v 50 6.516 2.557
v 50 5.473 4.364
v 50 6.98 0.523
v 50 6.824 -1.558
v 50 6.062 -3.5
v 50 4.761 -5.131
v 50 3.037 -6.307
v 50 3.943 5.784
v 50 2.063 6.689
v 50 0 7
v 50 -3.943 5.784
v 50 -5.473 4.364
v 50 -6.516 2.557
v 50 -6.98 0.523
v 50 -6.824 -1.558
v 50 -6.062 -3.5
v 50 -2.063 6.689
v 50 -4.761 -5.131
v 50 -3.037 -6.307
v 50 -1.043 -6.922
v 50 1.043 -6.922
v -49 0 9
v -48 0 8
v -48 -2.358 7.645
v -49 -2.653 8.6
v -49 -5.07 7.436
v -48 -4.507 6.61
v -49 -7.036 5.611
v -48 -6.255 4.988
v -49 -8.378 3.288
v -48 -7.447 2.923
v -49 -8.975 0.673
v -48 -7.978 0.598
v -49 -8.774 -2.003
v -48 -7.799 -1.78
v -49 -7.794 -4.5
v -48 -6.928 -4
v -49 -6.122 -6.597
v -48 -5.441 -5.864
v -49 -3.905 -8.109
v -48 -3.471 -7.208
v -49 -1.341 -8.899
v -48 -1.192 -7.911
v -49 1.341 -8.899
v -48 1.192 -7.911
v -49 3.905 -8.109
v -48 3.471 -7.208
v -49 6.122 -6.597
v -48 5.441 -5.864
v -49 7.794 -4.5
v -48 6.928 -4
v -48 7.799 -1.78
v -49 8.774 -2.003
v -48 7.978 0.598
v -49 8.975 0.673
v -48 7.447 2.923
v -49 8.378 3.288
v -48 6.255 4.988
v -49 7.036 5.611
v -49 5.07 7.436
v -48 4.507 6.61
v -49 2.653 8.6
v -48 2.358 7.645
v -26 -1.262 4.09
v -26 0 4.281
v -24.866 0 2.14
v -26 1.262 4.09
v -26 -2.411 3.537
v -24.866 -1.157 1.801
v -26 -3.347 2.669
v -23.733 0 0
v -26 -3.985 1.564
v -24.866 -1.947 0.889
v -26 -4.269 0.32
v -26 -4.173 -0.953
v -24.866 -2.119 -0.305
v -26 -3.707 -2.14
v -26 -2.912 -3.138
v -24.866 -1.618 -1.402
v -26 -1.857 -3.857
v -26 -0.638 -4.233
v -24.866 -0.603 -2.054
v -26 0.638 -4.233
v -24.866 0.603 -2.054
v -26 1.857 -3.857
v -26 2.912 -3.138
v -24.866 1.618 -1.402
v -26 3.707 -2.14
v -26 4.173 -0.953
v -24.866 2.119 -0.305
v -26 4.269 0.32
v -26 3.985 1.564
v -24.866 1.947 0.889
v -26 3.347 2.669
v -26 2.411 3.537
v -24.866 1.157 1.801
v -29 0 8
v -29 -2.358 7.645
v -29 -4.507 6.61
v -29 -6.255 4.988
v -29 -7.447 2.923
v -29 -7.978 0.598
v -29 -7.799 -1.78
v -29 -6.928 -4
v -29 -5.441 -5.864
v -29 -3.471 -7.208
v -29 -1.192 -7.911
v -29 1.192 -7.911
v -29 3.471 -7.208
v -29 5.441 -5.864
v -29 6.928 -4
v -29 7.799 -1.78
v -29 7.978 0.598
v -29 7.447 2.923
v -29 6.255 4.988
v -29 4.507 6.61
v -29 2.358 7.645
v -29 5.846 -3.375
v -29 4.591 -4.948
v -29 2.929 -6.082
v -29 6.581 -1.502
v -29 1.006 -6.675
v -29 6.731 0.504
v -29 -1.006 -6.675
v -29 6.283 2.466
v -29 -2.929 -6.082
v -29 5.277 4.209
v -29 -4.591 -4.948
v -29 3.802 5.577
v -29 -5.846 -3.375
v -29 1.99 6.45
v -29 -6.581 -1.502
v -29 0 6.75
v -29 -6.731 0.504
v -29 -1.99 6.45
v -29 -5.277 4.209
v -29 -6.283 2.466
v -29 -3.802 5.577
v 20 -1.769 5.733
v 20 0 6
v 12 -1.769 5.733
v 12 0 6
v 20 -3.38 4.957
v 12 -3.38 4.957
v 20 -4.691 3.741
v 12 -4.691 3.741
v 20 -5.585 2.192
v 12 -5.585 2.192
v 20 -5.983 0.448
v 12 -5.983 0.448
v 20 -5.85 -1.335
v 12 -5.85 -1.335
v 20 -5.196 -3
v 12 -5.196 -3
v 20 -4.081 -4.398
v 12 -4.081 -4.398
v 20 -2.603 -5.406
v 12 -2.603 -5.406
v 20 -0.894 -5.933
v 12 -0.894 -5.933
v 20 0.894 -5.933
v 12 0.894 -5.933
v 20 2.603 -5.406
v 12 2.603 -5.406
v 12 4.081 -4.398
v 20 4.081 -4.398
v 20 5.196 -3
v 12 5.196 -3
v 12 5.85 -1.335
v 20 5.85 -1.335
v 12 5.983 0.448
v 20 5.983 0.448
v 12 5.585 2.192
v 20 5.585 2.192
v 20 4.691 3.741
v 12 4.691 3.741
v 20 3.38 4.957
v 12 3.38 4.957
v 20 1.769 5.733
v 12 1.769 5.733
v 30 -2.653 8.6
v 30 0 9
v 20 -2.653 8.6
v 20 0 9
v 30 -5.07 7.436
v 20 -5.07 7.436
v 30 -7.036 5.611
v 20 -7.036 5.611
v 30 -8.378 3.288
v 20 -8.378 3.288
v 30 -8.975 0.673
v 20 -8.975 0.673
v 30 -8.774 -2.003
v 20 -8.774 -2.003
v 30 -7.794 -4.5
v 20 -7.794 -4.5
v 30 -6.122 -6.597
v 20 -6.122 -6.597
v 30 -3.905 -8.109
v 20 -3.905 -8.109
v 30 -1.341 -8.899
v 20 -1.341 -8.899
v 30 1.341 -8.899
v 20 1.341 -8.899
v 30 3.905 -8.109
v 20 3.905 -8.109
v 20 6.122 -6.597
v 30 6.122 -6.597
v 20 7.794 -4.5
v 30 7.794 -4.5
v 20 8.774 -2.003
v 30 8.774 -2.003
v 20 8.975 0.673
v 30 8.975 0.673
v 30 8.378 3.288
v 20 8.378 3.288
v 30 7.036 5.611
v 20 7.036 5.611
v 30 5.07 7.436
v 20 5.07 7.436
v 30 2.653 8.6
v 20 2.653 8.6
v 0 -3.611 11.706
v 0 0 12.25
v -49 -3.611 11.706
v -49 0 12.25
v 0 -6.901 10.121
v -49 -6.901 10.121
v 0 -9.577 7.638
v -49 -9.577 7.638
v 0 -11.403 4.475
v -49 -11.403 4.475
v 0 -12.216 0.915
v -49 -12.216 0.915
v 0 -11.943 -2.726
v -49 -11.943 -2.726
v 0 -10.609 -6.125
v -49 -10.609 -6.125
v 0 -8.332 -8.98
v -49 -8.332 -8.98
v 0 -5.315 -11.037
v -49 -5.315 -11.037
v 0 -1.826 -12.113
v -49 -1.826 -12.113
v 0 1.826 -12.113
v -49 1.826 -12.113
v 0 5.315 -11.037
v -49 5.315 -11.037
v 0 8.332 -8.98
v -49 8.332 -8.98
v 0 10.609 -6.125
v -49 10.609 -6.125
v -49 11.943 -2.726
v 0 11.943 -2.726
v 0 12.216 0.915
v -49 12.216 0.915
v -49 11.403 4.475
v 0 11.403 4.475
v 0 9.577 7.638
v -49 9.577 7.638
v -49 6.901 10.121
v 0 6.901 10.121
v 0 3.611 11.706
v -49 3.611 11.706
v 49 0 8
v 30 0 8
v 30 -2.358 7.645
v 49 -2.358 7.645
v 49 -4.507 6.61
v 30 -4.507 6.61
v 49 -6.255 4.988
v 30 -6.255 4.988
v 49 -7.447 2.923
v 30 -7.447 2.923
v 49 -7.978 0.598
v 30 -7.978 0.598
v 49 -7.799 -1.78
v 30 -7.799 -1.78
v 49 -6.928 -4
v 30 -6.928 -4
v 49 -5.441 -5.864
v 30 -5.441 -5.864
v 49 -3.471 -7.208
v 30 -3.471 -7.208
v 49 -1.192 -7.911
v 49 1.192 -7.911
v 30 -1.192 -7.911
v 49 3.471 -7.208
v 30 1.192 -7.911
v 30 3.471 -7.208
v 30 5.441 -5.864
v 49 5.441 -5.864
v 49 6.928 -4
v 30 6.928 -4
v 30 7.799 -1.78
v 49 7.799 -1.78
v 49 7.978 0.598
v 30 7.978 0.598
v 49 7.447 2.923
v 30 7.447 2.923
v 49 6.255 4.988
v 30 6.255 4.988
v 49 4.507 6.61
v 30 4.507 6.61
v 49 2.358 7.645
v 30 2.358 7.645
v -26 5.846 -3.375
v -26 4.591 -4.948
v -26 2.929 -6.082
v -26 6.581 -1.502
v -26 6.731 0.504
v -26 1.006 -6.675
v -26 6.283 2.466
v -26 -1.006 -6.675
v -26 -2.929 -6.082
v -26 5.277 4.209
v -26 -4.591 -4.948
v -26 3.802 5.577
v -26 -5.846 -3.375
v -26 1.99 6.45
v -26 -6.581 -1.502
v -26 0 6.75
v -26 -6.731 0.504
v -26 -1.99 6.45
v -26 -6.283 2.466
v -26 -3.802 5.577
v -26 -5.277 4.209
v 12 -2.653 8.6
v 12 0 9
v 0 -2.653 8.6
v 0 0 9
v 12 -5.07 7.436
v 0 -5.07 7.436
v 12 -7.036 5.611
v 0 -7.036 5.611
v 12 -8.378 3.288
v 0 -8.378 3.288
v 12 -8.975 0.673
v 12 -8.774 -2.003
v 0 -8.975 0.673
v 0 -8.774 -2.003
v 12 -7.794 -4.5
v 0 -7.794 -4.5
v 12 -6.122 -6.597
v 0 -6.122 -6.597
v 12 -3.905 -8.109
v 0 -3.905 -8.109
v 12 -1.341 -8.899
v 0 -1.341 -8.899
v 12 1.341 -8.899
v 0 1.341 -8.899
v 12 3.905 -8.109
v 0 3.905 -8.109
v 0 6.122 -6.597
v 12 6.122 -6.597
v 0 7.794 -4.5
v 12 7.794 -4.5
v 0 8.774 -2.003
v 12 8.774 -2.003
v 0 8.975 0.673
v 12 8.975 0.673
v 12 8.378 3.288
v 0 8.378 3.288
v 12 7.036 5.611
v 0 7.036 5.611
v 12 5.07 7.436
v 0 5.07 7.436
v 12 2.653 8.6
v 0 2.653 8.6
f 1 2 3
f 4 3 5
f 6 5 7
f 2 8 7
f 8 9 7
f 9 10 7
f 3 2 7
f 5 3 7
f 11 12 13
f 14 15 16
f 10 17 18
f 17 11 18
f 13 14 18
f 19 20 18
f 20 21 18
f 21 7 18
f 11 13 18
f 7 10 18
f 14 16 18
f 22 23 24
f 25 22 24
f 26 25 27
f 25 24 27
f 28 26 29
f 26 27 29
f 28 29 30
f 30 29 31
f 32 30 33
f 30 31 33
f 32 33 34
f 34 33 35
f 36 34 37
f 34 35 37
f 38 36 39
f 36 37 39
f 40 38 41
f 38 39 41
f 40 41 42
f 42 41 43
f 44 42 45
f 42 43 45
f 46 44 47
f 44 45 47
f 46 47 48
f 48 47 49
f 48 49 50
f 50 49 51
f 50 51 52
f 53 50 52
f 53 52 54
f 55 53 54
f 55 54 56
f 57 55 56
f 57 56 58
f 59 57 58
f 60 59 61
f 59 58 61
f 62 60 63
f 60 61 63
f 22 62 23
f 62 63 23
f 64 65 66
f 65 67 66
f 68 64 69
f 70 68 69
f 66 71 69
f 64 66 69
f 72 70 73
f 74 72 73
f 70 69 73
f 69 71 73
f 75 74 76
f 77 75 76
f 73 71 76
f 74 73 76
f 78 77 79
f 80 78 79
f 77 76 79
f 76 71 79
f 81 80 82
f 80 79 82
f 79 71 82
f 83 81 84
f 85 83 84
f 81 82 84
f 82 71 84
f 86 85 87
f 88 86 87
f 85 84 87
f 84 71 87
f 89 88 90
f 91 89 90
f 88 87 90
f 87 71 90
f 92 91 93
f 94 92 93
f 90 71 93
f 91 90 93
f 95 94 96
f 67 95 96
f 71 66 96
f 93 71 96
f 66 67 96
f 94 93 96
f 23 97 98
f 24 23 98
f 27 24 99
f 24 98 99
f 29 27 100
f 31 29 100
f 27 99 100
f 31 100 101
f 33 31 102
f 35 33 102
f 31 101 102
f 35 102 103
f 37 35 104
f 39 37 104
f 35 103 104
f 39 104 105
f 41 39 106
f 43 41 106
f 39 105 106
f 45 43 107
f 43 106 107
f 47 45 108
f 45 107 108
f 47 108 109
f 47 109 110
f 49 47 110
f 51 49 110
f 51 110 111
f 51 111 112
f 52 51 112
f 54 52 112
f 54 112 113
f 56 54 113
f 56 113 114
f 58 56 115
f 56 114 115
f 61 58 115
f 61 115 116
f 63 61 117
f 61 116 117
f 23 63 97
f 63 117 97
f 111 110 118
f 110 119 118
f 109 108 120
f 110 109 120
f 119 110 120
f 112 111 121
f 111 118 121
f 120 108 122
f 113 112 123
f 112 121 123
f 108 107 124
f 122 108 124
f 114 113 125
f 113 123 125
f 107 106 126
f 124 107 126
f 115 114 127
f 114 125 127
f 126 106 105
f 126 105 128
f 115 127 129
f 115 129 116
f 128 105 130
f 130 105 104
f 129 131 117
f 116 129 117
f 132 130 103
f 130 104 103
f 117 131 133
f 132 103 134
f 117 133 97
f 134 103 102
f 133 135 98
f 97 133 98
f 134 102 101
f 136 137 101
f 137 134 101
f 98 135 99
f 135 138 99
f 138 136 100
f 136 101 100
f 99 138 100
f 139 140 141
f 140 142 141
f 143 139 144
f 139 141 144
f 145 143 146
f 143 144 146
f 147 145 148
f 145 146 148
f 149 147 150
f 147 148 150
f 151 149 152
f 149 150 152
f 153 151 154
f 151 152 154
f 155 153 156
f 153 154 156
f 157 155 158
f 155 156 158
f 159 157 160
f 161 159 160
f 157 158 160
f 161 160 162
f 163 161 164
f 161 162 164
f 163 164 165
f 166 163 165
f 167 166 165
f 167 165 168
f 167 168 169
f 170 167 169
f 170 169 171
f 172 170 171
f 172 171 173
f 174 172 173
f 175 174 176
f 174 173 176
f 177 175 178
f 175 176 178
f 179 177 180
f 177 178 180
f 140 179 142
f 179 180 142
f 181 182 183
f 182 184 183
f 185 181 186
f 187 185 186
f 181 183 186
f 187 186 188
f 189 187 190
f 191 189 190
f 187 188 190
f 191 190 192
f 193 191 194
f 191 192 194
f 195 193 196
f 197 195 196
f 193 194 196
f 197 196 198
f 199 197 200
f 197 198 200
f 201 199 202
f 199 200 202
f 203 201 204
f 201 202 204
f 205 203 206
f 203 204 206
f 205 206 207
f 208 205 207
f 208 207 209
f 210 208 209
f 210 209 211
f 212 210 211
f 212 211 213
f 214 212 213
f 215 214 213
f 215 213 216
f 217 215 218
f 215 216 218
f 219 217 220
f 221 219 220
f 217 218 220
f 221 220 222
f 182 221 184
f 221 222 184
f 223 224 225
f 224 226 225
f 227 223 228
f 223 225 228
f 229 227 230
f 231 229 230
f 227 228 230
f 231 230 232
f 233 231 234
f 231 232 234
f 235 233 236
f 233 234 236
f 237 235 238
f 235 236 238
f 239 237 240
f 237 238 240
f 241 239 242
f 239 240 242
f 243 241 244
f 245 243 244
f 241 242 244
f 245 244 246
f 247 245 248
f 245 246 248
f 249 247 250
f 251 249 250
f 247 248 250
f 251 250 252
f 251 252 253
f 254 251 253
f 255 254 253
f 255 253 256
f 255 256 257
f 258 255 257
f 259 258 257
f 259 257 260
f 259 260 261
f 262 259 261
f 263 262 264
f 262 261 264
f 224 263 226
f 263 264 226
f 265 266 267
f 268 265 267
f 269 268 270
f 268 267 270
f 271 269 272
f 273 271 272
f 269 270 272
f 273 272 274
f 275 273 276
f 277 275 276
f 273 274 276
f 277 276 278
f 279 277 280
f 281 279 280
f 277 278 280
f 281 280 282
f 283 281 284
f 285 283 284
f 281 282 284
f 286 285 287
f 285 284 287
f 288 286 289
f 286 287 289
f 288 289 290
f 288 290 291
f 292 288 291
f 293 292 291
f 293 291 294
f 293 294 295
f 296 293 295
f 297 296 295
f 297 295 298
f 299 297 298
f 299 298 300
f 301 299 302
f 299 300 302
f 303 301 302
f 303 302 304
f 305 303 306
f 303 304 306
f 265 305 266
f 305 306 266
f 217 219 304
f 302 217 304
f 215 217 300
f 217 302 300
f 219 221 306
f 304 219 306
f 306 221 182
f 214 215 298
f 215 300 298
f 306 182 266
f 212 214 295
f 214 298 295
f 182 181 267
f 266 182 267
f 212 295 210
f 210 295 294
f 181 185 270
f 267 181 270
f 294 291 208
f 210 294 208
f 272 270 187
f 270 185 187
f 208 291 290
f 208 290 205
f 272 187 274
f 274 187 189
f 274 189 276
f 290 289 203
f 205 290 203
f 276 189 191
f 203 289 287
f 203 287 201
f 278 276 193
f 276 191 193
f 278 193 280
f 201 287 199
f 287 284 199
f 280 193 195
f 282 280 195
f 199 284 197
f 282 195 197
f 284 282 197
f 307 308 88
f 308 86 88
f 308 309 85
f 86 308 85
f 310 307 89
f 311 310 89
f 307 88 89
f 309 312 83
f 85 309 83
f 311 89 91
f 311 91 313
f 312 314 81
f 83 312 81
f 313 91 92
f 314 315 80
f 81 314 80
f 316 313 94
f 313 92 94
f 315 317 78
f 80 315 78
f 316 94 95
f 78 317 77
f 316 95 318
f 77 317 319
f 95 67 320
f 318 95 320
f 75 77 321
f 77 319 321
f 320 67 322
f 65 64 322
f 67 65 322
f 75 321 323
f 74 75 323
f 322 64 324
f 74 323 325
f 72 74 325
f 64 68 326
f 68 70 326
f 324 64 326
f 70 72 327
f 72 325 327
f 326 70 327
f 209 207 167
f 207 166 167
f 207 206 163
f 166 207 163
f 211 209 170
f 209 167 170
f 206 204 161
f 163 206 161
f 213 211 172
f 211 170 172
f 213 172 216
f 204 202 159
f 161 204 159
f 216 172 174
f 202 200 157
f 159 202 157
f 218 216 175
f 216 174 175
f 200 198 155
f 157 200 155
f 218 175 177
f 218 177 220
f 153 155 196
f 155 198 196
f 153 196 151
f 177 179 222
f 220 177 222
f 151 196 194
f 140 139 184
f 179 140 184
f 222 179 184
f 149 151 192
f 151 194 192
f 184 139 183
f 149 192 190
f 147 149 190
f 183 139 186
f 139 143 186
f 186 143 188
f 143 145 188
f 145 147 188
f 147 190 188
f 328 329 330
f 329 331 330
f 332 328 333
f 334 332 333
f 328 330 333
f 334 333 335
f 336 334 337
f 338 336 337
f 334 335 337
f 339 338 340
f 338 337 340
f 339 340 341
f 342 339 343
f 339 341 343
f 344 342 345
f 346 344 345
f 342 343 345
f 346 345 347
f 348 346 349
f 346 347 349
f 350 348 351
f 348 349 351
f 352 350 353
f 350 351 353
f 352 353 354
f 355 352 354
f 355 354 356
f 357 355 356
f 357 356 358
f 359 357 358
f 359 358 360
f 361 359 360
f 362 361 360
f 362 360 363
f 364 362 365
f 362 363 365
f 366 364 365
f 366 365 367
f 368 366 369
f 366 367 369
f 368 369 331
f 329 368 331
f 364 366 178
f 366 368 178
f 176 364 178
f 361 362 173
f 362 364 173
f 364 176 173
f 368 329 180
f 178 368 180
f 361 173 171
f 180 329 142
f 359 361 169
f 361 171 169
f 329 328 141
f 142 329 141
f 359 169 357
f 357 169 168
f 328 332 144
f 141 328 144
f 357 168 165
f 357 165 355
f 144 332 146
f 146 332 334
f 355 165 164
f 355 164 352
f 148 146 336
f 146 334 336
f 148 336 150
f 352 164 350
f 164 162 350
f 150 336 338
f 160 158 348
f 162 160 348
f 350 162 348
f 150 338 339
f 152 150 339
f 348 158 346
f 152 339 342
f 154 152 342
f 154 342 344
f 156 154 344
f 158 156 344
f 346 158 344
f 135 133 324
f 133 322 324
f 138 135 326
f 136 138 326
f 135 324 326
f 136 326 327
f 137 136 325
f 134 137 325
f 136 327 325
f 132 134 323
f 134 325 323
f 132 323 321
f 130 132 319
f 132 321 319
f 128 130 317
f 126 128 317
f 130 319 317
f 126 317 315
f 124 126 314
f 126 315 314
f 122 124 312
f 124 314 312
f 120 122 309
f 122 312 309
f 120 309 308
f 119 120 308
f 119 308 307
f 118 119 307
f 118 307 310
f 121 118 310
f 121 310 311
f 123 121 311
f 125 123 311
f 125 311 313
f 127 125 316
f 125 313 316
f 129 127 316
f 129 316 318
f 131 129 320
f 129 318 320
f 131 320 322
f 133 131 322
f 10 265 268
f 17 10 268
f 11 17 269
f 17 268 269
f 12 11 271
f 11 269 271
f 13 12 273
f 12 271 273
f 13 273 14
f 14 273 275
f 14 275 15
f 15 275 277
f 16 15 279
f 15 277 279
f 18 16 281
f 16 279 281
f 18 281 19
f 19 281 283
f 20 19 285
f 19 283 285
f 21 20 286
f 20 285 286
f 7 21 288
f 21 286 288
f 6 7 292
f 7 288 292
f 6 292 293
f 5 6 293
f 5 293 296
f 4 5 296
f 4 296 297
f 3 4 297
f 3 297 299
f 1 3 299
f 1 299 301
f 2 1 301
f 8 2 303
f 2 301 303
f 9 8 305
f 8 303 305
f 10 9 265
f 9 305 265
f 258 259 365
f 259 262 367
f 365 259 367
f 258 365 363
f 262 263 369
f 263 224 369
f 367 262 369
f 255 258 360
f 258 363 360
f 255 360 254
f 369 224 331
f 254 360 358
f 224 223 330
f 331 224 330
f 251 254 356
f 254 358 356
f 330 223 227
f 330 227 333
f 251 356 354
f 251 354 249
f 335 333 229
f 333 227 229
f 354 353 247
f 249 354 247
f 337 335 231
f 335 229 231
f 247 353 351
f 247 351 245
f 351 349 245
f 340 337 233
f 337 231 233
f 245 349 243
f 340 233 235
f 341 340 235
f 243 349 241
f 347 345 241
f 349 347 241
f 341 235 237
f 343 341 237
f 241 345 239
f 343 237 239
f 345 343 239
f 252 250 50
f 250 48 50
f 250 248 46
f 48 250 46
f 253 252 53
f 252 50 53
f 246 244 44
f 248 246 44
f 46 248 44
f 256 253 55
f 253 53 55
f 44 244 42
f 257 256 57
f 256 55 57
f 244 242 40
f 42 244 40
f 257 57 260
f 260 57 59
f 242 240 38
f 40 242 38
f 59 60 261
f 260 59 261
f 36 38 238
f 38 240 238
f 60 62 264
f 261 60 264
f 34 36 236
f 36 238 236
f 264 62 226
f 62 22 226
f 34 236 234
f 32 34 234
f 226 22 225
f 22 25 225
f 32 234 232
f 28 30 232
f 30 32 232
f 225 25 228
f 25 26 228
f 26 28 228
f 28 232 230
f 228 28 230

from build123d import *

# Parameters (mm, degrees)
F2_SIZE = 1
F3_SIZE = 1


with BuildPart() as f1:
    # F0 (on Front) → F1 (revolve)
    with BuildSketch(Plane.XZ):
        Polygon((-49, 8), (-29, 8), (-29, 6.75), (-26, 6.75), (-26, 4.28064), (-23.732601, 0), (50, 0), (50, 8), (30, 8), (30, 9), (20, 9), (20, 6), (12, 6), (12, 9), (0, 9), (0, 12.25), (-49, 12.25), align=None)
    revolve(axis=Axis((13.1337, 0, 0), (1, 0, 0)))

    # F2
    f2_edges = [f1.edges().sort_by_distance(p)[0] for p in [
        (50, 0, -8),
    ]]
    chamfer(f2_edges, length=F2_SIZE)

    # F3
    f3_edges = [f1.edges().sort_by_distance(p)[0] for p in [
        (-49, 0, -8),
    ]]
    chamfer(f3_edges, length=F3_SIZE)


solid = f1.part
